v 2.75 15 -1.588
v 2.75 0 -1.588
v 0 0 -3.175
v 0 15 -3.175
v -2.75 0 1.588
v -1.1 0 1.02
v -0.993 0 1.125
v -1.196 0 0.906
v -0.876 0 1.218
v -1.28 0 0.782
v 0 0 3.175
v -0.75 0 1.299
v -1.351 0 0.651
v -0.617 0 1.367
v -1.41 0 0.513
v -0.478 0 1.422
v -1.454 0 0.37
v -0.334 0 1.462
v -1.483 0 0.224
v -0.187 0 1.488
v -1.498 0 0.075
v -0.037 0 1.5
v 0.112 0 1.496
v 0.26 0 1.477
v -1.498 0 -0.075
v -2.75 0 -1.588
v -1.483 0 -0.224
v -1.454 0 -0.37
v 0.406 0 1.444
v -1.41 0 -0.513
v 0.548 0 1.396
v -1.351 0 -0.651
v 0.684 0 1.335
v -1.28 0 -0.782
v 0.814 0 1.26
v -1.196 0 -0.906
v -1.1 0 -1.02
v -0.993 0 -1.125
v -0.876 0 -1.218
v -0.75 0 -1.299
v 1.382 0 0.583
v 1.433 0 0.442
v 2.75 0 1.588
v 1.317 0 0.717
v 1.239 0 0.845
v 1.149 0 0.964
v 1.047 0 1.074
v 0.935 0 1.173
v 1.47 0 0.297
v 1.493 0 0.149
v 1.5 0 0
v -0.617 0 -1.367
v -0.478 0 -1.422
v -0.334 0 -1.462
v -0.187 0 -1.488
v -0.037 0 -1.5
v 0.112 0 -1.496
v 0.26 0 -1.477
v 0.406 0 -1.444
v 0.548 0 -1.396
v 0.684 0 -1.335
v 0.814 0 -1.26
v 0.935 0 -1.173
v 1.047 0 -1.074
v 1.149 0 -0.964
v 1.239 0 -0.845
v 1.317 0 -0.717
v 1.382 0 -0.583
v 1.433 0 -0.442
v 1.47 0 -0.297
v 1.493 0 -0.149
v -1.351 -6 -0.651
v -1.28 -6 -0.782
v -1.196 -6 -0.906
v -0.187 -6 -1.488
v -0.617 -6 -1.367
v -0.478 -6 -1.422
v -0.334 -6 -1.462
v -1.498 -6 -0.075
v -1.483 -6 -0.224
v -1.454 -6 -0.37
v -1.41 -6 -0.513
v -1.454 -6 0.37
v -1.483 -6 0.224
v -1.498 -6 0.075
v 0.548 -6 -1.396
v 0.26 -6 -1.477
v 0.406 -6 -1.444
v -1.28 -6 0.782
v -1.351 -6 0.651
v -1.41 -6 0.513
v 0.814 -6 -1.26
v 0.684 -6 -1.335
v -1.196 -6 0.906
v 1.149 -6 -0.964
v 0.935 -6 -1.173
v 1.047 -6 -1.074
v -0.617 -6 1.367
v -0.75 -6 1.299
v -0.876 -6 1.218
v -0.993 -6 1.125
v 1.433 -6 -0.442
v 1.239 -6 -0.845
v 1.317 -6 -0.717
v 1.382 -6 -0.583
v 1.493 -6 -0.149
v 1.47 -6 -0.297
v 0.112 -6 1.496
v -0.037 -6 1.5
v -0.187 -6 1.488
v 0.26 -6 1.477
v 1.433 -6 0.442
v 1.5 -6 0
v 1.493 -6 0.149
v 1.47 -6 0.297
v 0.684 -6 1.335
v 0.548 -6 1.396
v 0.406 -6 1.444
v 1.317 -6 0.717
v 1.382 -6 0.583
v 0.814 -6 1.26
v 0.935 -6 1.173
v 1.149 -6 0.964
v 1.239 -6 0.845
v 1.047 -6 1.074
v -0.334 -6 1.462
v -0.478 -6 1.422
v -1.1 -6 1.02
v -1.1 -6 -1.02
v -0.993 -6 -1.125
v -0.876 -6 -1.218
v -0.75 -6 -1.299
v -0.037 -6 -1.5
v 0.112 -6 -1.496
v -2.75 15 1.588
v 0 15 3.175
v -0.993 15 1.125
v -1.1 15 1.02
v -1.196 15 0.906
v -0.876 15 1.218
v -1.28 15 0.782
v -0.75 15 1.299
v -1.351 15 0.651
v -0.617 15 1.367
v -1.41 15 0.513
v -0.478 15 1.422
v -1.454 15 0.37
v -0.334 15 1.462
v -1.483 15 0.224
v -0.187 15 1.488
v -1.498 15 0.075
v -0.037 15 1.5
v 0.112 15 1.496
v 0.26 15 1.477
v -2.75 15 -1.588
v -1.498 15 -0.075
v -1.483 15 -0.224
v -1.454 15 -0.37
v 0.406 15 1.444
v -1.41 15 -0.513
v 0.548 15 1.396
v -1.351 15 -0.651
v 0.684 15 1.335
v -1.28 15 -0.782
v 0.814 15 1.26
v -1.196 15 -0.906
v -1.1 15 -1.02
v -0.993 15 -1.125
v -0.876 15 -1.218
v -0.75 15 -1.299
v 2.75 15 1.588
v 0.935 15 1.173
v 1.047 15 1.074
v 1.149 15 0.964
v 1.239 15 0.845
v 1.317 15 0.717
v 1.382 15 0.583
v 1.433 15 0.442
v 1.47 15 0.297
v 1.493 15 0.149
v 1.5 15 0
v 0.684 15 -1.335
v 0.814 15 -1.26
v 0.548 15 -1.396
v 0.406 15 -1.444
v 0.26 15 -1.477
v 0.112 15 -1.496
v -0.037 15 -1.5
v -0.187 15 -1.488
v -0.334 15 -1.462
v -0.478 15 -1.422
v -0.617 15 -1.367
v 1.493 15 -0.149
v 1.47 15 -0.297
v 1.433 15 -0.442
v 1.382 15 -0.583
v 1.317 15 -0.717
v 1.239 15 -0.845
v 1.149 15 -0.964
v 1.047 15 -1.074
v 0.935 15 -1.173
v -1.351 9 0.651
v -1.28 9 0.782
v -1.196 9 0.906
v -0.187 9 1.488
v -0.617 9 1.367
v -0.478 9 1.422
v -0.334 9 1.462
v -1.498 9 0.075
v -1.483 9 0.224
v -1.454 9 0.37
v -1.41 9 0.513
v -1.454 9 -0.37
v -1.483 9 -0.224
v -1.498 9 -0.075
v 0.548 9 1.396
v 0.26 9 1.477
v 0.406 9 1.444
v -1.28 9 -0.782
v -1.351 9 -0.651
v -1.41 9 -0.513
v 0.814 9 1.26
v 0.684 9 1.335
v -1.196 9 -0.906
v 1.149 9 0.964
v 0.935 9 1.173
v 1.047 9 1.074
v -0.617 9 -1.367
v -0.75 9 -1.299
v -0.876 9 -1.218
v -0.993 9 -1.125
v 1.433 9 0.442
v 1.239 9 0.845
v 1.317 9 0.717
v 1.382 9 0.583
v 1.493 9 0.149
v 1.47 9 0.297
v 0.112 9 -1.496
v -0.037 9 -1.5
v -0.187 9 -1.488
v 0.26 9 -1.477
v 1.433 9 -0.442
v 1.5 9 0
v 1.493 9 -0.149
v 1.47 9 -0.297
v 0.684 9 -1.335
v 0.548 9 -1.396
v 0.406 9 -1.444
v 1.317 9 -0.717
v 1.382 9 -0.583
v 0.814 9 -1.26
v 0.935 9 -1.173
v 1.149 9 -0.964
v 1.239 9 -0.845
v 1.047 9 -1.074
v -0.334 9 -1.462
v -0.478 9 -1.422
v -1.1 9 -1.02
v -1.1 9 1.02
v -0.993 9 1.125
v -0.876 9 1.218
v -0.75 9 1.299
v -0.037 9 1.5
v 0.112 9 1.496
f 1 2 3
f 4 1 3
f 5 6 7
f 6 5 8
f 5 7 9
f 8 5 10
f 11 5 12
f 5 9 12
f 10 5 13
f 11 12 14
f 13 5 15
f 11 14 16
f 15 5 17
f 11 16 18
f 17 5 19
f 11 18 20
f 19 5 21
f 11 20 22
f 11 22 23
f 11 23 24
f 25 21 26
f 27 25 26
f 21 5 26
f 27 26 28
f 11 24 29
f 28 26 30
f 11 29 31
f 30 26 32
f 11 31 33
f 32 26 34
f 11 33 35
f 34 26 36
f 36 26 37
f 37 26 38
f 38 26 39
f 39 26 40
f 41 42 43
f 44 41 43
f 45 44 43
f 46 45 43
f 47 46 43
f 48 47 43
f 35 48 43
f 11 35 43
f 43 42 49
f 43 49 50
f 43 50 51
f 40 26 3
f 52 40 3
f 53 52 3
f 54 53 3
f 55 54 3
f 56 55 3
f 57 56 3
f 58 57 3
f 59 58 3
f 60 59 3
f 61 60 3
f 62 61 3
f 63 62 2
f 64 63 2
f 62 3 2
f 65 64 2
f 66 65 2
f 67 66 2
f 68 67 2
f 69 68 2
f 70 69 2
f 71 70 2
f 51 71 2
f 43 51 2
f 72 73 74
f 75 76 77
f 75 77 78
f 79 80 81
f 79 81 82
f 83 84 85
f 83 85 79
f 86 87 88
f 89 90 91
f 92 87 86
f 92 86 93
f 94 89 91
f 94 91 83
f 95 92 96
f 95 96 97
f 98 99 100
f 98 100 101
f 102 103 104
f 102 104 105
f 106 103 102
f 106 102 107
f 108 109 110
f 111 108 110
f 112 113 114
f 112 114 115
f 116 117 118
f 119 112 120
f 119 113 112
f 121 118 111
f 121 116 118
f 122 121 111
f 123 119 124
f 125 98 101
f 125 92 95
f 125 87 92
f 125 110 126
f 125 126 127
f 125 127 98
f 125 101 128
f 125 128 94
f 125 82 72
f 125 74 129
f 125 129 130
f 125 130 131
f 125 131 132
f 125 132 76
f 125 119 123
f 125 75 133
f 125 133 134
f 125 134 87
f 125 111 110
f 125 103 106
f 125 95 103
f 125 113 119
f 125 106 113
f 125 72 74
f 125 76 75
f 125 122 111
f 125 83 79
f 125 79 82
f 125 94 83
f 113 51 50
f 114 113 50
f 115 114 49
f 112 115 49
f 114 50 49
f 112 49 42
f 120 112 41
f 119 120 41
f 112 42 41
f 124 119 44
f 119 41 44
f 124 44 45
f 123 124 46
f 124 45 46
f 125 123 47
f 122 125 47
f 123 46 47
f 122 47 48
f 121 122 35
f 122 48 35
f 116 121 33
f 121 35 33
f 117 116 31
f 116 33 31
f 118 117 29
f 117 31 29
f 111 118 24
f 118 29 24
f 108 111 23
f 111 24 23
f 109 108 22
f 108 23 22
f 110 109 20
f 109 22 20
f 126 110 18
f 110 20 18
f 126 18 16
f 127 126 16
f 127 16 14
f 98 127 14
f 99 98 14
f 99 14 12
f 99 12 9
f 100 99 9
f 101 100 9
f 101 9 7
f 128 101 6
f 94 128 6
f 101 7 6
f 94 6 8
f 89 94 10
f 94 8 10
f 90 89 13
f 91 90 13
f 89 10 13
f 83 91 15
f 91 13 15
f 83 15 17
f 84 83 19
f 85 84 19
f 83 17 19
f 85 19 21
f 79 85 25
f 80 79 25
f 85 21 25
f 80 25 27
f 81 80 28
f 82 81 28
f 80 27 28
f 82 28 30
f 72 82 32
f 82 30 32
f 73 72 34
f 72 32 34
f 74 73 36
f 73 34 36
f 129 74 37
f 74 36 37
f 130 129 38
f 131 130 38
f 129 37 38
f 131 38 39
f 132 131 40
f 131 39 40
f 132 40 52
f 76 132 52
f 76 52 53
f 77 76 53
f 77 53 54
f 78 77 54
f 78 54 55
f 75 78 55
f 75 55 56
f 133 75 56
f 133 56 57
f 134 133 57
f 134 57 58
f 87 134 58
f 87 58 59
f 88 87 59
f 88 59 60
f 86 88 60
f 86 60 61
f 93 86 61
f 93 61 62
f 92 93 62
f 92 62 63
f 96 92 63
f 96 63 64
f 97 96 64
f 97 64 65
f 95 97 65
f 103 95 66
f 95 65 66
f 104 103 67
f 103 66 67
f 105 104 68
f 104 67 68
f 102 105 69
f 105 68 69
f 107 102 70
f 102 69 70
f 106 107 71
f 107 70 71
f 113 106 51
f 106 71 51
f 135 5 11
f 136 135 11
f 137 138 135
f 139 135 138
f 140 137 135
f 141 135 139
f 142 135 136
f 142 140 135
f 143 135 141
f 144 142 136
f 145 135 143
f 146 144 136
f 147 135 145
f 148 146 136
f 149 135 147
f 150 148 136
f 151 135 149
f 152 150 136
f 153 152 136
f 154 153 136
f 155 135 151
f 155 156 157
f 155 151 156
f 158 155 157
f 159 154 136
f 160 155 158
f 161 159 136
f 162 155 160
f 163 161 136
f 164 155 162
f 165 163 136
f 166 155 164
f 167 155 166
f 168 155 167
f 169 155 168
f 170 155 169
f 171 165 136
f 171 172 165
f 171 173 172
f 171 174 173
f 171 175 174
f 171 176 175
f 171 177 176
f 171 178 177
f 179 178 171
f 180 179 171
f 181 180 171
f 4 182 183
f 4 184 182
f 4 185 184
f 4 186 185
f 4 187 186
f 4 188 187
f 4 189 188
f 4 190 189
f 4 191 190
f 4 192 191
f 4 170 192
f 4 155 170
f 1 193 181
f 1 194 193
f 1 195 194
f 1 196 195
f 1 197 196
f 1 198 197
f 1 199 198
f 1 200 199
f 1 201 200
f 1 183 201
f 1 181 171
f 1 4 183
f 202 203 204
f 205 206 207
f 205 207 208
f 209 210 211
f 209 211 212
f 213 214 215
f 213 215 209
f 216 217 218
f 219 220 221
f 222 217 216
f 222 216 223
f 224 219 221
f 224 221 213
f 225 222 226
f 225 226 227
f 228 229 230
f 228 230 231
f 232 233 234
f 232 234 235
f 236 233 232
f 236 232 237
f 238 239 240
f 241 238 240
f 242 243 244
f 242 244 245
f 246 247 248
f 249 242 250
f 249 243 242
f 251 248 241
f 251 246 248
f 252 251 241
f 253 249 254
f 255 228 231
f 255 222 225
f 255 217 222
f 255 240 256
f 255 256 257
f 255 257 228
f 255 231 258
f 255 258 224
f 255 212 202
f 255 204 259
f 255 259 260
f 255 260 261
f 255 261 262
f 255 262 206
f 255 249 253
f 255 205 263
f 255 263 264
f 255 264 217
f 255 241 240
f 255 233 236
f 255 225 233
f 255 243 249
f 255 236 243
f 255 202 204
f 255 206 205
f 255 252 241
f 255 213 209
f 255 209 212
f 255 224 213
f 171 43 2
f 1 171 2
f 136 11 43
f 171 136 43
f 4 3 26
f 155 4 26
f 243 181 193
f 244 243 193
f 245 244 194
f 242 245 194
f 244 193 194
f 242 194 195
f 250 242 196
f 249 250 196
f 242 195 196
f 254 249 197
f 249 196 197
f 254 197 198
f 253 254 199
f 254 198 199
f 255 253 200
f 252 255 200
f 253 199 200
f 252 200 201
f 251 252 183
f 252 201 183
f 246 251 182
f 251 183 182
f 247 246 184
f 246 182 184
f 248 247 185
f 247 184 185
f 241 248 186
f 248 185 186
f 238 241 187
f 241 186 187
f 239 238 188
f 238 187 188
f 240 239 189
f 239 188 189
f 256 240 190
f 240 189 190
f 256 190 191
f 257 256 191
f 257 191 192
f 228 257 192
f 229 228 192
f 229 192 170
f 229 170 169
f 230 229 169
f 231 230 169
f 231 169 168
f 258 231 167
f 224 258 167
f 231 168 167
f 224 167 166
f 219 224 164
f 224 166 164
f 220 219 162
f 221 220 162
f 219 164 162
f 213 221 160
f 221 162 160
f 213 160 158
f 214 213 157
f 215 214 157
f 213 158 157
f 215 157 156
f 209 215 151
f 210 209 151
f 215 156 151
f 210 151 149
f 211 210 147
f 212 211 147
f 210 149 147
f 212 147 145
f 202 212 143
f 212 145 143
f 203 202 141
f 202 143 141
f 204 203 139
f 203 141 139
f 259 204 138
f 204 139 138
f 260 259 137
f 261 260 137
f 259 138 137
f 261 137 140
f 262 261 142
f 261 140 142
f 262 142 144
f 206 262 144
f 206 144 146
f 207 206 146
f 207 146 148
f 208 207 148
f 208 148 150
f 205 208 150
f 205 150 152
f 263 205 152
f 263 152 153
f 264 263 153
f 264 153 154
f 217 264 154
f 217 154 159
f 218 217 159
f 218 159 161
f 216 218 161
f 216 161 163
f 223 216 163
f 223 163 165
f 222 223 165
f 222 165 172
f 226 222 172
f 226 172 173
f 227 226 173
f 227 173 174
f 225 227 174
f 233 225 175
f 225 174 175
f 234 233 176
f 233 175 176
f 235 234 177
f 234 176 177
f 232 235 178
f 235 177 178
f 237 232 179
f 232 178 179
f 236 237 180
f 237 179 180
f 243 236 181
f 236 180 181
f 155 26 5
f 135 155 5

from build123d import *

# Parameters (mm, degrees)
SALIENTE_EXTRUIR1_DEPTH = 15
CROQUIS2_R              = 1.5
SALIENTE_EXTRUIR2_DEPTH = 6
CROQUIS3_R              = 1.5
CORTAR_EXTRUIR1_DEPTH   = 6


with BuildPart() as part:
    # Croquis1 → Saliente-Extruir1 (new body)
    with BuildSketch(Plane(origin=(0, 0, 0), x_dir=(1, 0, 0), z_dir=(0, 1, 0))):
        Polygon((0, 3.175426481), (-2.75, 1.58771324), (-2.75, -1.58771324), (0, -3.175426481), (2.75, -1.58771324), (2.75, 1.58771324), align=None)
    extrude(amount=SALIENTE_EXTRUIR1_DEPTH)

    # Croquis2 → Saliente-Extruir2 (add)
    with BuildSketch(Plane.XZ):
        Circle(CROQUIS2_R)
    extrude(amount=SALIENTE_EXTRUIR2_DEPTH)

    # Croquis3 → Cortar-Extruir1 (cut)
    with BuildSketch(Plane(origin=(0, 15, 0), x_dir=(1, 0, 0), z_dir=(0, 1, 0))):
        Circle(CROQUIS3_R)
    extrude(amount=-CORTAR_EXTRUIR1_DEPTH, mode=Mode.SUBTRACT)


solid = part.part
